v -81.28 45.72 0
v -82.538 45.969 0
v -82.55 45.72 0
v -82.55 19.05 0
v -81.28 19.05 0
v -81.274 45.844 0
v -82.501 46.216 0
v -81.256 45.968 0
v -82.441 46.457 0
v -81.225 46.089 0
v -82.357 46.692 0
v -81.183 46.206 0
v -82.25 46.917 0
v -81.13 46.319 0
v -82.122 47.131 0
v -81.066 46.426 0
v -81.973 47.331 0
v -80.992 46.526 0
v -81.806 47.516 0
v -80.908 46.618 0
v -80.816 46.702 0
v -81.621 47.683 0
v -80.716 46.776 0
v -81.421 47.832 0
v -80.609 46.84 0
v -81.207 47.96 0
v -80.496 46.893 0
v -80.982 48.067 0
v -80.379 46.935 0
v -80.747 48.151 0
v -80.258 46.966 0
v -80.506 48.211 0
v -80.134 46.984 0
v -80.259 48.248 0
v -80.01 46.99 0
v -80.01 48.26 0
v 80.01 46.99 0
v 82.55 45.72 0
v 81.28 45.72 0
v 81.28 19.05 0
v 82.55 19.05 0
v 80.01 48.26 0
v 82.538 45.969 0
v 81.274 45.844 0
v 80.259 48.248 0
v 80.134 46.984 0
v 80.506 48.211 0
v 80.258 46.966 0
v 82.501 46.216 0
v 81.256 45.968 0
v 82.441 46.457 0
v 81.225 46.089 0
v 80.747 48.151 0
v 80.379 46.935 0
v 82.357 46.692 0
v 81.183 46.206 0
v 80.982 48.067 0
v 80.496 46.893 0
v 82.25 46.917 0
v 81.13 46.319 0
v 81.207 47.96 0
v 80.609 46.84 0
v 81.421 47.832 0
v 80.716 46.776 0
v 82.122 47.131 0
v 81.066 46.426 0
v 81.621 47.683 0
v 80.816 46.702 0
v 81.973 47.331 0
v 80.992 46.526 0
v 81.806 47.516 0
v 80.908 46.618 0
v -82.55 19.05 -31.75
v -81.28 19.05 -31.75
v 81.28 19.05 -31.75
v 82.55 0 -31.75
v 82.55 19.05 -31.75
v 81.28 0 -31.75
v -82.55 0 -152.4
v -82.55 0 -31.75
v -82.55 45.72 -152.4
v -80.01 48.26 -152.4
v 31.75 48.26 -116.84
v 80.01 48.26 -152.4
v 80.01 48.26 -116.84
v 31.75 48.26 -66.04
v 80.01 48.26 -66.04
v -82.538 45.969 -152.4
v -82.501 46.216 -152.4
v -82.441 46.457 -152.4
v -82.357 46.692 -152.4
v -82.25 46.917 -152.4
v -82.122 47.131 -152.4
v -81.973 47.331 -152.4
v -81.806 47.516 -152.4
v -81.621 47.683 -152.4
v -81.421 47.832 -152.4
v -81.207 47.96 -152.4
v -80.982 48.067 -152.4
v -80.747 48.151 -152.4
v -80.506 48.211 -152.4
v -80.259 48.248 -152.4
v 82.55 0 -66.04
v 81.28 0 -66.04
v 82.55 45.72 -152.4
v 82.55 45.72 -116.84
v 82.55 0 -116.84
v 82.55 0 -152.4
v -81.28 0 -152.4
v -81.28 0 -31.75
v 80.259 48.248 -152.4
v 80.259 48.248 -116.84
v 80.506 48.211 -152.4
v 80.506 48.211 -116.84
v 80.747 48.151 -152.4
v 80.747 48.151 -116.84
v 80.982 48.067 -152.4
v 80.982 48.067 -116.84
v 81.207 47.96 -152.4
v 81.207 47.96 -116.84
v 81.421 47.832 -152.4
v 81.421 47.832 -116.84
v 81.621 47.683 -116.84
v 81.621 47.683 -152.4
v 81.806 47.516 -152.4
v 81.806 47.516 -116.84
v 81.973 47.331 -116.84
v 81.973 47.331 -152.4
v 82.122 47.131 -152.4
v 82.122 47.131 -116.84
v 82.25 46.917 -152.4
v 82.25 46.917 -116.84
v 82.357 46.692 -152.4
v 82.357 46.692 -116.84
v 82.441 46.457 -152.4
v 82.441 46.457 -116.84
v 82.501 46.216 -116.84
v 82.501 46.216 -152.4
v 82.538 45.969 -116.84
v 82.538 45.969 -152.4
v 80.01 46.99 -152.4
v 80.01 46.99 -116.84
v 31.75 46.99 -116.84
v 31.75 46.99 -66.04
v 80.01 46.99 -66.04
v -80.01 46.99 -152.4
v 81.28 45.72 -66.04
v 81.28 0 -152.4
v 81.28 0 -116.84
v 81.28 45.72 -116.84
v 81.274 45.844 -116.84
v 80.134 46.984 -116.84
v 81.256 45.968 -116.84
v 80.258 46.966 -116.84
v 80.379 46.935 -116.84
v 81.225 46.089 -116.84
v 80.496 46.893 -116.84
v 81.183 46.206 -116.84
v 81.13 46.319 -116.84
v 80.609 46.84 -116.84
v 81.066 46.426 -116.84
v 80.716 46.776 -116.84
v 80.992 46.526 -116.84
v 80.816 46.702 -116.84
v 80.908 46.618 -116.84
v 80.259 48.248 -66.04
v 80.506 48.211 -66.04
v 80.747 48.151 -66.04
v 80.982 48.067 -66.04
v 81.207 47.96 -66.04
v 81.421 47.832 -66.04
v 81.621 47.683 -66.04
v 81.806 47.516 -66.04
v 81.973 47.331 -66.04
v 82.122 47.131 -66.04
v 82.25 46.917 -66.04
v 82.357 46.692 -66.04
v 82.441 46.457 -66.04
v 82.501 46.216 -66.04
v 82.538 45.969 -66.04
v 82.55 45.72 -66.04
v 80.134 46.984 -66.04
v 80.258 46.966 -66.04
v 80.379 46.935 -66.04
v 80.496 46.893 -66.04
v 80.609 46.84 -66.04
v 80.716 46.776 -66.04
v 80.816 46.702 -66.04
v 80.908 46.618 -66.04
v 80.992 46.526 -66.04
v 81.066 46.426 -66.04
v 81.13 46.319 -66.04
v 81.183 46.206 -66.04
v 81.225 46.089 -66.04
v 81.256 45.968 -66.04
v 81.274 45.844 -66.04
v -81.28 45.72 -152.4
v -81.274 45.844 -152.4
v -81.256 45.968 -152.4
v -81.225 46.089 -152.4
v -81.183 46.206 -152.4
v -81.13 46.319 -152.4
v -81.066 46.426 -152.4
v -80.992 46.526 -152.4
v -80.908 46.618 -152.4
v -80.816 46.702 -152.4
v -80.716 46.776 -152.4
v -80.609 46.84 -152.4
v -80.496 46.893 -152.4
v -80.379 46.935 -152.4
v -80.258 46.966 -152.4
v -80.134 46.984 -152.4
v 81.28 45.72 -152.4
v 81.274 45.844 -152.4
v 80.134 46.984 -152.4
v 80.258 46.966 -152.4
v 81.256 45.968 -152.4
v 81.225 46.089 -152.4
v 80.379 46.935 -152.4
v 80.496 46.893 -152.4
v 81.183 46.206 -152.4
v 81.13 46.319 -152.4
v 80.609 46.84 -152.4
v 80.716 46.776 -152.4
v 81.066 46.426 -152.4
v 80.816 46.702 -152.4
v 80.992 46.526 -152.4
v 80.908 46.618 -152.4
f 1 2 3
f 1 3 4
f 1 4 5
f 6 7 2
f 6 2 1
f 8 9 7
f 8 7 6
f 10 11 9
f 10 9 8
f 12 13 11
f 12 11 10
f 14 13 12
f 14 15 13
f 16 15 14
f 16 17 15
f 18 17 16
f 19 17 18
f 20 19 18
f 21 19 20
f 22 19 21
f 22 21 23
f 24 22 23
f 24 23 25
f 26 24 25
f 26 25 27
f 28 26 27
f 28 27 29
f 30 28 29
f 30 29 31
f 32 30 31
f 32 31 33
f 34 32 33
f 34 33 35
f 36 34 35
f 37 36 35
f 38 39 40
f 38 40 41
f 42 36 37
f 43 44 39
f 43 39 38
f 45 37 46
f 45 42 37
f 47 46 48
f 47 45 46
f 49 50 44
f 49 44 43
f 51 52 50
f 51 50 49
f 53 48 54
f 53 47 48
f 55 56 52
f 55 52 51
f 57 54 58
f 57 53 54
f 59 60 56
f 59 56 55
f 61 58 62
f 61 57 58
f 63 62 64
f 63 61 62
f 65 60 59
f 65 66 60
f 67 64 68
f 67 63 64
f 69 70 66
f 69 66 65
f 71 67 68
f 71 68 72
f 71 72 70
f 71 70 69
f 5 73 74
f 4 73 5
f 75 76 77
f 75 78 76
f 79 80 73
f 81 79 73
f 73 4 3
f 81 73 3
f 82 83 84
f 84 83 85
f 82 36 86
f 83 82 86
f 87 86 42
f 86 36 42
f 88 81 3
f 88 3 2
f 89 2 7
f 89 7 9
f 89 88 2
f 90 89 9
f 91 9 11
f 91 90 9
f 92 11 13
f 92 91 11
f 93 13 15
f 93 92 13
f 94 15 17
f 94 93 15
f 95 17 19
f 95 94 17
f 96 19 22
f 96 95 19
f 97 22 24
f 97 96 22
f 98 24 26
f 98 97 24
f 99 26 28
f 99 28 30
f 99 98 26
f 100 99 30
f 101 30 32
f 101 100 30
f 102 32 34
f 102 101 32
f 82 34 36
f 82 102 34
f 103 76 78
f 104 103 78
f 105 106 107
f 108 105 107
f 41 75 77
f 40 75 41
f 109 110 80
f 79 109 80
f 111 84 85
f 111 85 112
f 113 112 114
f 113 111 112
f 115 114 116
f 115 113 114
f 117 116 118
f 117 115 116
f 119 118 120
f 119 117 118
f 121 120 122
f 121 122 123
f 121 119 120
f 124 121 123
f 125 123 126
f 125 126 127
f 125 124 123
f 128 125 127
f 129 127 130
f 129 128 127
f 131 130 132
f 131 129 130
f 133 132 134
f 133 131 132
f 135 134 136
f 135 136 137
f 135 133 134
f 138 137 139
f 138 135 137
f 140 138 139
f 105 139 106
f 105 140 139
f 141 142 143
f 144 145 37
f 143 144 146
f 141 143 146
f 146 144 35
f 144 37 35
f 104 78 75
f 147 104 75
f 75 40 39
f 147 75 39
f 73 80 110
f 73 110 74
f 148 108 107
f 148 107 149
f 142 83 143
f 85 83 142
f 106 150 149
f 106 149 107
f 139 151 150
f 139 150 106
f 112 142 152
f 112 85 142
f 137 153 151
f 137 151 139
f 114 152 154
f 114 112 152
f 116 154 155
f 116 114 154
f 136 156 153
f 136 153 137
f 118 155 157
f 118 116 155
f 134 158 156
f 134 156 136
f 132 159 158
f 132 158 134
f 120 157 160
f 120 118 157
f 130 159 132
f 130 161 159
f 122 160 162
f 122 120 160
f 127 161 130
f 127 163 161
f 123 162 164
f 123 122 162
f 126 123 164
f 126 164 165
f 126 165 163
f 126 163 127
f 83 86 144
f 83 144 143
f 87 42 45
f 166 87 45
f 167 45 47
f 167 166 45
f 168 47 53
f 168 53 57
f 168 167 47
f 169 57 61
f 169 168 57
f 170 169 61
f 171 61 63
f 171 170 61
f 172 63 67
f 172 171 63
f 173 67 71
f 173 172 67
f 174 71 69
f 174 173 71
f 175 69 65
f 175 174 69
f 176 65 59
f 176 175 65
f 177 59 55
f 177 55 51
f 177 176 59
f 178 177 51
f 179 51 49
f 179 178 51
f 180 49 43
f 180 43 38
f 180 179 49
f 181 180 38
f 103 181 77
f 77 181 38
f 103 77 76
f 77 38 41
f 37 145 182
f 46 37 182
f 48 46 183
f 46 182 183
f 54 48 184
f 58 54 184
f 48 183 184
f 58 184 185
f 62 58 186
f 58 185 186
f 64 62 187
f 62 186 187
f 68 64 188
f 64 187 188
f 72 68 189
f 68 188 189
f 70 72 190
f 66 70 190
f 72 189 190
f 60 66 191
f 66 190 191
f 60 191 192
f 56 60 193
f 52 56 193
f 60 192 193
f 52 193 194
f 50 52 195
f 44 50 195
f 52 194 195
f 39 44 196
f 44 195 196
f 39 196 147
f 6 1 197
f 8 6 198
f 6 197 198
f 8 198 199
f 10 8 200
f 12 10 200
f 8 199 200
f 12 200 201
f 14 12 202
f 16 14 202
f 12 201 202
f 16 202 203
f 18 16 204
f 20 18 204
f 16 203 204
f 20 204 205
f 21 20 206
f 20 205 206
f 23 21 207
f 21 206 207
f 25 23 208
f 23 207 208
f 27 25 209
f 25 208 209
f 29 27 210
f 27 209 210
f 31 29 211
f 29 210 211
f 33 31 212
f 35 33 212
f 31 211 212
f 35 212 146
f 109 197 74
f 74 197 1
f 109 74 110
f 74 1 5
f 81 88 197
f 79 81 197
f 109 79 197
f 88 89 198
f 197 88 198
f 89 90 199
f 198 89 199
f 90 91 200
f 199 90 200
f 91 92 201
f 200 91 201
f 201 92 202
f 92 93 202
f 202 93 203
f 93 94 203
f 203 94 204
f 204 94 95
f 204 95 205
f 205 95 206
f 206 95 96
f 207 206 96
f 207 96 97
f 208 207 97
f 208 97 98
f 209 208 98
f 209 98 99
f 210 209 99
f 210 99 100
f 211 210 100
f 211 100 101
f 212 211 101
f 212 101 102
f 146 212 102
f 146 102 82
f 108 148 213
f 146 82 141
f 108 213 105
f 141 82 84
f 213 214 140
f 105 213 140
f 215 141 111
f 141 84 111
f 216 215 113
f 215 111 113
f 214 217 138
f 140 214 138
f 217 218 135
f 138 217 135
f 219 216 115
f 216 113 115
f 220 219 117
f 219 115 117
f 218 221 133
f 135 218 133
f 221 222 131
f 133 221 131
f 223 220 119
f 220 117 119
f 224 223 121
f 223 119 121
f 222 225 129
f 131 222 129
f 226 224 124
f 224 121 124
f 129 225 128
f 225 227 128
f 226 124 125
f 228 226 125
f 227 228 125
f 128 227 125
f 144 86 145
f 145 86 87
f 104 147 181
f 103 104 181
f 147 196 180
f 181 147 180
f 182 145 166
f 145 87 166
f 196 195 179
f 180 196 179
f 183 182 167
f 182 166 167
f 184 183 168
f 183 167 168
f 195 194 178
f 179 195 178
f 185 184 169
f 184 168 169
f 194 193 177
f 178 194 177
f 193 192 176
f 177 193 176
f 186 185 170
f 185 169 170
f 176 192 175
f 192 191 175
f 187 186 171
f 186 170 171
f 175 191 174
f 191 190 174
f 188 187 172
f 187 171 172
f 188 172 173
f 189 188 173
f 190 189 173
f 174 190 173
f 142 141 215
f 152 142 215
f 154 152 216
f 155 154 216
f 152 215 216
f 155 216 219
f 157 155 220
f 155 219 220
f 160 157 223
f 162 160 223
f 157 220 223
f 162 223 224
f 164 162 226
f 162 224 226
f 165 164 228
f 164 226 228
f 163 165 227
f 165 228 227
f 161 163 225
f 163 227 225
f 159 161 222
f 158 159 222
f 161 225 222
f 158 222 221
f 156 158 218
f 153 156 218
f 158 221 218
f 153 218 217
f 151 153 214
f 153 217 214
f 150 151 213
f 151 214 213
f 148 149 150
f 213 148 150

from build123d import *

# Parameters (mm, degrees)
BOSS_EXTRUDE1_DEPTH    = 152.4
CONVERT_SOLID1_START   = -152.4
CONVERT_SOLID1_DEPTH   = 152.4
CONVERT_SOLID1_2_DEPTH = 152.4
SKETCH6_W              = 60.654765258
SKETCH6_H              = 35.589797731
CUT_EXTRUDE1_DEPTH     = 230.810351377
SKETCH7_W              = 82.570052287
SKETCH7_H              = 50.8
CUT_EXTRUDE2_DEPTH     = 180.914674499


# Read off the part's stored shape, not the designer's step: Convert-Solid1
with BuildPart() as part:
    # Sketch1 → Boss-Extrude1 (new body)
    with BuildSketch(Plane.XY):
        Polygon((-82.55, 0), (-82.55, 48.26), (82.55, 48.26), (82.55, 0), (81.28, 0), (81.28, 46.99), (-81.28, 46.99), (-81.28, 0), align=None)
    extrude(amount=-BOSS_EXTRUDE1_DEPTH)

    # Convert-Solid1 outline → Convert-Solid1 (cut)
    with BuildSketch(Plane.XY.offset(CONVERT_SOLID1_START)):
        with BuildLine():
            Line((82.55, 48.26), (80.01, 48.26))
            ThreePointArc((80.01, 48.26), (81.806051224, 47.516051224), (82.55, 45.72))
            Line((82.55, 45.72), (82.55, 48.26))
        make_face()
        with BuildLine():
            ThreePointArc((-82.55, 45.72), (-81.806051224, 47.516051224), (-80.01, 48.26))
            Line((-80.01, 48.26), (-82.55, 48.26))
            Line((-82.55, 48.26), (-82.55, 45.72))
        make_face()
    extrude(amount=CONVERT_SOLID1_DEPTH, mode=Mode.SUBTRACT)

    # Convert-Solid1 2 outline → Convert-Solid1 2 (add)
    with BuildSketch(Plane.XY.offset(CONVERT_SOLID1_START)):
        with BuildLine():
            Line((81.28, 46.99), (80.01, 46.99))
            ThreePointArc((80.01, 46.99), (80.908025612, 46.618025612), (81.28, 45.72))
            Line((81.28, 45.72), (81.28, 46.99))
        make_face()
        with BuildLine():
            ThreePointArc((-81.28, 45.72), (-80.908025612, 46.618025612), (-80.01, 46.99))
            Line((-80.01, 46.99), (-81.28, 46.99))
            Line((-81.28, 46.99), (-81.28, 45.72))
        make_face()
    extrude(amount=CONVERT_SOLID1_2_DEPTH)

    # Sketch6 → Cut-Extrude1 (cut, through all)
    with BuildSketch(Plane.ZY.offset(82.55)):
        with Locations((-1.422617371, 1.255101135)):
            Rectangle(SKETCH6_W, SKETCH6_H)
    extrude(amount=-CUT_EXTRUDE1_DEPTH, mode=Mode.SUBTRACT)

    # Sketch7 → Cut-Extrude2 (cut, through all)
    with BuildSketch(Plane(origin=(0, 48.26, 0), x_dir=(1, 0, 0), z_dir=(0, 1, 0))):
        with Locations((73.035026144, 91.44)):
            Rectangle(SKETCH7_W, SKETCH7_H)
    extrude(amount=-CUT_EXTRUDE2_DEPTH, mode=Mode.SUBTRACT)


solid = part.part
